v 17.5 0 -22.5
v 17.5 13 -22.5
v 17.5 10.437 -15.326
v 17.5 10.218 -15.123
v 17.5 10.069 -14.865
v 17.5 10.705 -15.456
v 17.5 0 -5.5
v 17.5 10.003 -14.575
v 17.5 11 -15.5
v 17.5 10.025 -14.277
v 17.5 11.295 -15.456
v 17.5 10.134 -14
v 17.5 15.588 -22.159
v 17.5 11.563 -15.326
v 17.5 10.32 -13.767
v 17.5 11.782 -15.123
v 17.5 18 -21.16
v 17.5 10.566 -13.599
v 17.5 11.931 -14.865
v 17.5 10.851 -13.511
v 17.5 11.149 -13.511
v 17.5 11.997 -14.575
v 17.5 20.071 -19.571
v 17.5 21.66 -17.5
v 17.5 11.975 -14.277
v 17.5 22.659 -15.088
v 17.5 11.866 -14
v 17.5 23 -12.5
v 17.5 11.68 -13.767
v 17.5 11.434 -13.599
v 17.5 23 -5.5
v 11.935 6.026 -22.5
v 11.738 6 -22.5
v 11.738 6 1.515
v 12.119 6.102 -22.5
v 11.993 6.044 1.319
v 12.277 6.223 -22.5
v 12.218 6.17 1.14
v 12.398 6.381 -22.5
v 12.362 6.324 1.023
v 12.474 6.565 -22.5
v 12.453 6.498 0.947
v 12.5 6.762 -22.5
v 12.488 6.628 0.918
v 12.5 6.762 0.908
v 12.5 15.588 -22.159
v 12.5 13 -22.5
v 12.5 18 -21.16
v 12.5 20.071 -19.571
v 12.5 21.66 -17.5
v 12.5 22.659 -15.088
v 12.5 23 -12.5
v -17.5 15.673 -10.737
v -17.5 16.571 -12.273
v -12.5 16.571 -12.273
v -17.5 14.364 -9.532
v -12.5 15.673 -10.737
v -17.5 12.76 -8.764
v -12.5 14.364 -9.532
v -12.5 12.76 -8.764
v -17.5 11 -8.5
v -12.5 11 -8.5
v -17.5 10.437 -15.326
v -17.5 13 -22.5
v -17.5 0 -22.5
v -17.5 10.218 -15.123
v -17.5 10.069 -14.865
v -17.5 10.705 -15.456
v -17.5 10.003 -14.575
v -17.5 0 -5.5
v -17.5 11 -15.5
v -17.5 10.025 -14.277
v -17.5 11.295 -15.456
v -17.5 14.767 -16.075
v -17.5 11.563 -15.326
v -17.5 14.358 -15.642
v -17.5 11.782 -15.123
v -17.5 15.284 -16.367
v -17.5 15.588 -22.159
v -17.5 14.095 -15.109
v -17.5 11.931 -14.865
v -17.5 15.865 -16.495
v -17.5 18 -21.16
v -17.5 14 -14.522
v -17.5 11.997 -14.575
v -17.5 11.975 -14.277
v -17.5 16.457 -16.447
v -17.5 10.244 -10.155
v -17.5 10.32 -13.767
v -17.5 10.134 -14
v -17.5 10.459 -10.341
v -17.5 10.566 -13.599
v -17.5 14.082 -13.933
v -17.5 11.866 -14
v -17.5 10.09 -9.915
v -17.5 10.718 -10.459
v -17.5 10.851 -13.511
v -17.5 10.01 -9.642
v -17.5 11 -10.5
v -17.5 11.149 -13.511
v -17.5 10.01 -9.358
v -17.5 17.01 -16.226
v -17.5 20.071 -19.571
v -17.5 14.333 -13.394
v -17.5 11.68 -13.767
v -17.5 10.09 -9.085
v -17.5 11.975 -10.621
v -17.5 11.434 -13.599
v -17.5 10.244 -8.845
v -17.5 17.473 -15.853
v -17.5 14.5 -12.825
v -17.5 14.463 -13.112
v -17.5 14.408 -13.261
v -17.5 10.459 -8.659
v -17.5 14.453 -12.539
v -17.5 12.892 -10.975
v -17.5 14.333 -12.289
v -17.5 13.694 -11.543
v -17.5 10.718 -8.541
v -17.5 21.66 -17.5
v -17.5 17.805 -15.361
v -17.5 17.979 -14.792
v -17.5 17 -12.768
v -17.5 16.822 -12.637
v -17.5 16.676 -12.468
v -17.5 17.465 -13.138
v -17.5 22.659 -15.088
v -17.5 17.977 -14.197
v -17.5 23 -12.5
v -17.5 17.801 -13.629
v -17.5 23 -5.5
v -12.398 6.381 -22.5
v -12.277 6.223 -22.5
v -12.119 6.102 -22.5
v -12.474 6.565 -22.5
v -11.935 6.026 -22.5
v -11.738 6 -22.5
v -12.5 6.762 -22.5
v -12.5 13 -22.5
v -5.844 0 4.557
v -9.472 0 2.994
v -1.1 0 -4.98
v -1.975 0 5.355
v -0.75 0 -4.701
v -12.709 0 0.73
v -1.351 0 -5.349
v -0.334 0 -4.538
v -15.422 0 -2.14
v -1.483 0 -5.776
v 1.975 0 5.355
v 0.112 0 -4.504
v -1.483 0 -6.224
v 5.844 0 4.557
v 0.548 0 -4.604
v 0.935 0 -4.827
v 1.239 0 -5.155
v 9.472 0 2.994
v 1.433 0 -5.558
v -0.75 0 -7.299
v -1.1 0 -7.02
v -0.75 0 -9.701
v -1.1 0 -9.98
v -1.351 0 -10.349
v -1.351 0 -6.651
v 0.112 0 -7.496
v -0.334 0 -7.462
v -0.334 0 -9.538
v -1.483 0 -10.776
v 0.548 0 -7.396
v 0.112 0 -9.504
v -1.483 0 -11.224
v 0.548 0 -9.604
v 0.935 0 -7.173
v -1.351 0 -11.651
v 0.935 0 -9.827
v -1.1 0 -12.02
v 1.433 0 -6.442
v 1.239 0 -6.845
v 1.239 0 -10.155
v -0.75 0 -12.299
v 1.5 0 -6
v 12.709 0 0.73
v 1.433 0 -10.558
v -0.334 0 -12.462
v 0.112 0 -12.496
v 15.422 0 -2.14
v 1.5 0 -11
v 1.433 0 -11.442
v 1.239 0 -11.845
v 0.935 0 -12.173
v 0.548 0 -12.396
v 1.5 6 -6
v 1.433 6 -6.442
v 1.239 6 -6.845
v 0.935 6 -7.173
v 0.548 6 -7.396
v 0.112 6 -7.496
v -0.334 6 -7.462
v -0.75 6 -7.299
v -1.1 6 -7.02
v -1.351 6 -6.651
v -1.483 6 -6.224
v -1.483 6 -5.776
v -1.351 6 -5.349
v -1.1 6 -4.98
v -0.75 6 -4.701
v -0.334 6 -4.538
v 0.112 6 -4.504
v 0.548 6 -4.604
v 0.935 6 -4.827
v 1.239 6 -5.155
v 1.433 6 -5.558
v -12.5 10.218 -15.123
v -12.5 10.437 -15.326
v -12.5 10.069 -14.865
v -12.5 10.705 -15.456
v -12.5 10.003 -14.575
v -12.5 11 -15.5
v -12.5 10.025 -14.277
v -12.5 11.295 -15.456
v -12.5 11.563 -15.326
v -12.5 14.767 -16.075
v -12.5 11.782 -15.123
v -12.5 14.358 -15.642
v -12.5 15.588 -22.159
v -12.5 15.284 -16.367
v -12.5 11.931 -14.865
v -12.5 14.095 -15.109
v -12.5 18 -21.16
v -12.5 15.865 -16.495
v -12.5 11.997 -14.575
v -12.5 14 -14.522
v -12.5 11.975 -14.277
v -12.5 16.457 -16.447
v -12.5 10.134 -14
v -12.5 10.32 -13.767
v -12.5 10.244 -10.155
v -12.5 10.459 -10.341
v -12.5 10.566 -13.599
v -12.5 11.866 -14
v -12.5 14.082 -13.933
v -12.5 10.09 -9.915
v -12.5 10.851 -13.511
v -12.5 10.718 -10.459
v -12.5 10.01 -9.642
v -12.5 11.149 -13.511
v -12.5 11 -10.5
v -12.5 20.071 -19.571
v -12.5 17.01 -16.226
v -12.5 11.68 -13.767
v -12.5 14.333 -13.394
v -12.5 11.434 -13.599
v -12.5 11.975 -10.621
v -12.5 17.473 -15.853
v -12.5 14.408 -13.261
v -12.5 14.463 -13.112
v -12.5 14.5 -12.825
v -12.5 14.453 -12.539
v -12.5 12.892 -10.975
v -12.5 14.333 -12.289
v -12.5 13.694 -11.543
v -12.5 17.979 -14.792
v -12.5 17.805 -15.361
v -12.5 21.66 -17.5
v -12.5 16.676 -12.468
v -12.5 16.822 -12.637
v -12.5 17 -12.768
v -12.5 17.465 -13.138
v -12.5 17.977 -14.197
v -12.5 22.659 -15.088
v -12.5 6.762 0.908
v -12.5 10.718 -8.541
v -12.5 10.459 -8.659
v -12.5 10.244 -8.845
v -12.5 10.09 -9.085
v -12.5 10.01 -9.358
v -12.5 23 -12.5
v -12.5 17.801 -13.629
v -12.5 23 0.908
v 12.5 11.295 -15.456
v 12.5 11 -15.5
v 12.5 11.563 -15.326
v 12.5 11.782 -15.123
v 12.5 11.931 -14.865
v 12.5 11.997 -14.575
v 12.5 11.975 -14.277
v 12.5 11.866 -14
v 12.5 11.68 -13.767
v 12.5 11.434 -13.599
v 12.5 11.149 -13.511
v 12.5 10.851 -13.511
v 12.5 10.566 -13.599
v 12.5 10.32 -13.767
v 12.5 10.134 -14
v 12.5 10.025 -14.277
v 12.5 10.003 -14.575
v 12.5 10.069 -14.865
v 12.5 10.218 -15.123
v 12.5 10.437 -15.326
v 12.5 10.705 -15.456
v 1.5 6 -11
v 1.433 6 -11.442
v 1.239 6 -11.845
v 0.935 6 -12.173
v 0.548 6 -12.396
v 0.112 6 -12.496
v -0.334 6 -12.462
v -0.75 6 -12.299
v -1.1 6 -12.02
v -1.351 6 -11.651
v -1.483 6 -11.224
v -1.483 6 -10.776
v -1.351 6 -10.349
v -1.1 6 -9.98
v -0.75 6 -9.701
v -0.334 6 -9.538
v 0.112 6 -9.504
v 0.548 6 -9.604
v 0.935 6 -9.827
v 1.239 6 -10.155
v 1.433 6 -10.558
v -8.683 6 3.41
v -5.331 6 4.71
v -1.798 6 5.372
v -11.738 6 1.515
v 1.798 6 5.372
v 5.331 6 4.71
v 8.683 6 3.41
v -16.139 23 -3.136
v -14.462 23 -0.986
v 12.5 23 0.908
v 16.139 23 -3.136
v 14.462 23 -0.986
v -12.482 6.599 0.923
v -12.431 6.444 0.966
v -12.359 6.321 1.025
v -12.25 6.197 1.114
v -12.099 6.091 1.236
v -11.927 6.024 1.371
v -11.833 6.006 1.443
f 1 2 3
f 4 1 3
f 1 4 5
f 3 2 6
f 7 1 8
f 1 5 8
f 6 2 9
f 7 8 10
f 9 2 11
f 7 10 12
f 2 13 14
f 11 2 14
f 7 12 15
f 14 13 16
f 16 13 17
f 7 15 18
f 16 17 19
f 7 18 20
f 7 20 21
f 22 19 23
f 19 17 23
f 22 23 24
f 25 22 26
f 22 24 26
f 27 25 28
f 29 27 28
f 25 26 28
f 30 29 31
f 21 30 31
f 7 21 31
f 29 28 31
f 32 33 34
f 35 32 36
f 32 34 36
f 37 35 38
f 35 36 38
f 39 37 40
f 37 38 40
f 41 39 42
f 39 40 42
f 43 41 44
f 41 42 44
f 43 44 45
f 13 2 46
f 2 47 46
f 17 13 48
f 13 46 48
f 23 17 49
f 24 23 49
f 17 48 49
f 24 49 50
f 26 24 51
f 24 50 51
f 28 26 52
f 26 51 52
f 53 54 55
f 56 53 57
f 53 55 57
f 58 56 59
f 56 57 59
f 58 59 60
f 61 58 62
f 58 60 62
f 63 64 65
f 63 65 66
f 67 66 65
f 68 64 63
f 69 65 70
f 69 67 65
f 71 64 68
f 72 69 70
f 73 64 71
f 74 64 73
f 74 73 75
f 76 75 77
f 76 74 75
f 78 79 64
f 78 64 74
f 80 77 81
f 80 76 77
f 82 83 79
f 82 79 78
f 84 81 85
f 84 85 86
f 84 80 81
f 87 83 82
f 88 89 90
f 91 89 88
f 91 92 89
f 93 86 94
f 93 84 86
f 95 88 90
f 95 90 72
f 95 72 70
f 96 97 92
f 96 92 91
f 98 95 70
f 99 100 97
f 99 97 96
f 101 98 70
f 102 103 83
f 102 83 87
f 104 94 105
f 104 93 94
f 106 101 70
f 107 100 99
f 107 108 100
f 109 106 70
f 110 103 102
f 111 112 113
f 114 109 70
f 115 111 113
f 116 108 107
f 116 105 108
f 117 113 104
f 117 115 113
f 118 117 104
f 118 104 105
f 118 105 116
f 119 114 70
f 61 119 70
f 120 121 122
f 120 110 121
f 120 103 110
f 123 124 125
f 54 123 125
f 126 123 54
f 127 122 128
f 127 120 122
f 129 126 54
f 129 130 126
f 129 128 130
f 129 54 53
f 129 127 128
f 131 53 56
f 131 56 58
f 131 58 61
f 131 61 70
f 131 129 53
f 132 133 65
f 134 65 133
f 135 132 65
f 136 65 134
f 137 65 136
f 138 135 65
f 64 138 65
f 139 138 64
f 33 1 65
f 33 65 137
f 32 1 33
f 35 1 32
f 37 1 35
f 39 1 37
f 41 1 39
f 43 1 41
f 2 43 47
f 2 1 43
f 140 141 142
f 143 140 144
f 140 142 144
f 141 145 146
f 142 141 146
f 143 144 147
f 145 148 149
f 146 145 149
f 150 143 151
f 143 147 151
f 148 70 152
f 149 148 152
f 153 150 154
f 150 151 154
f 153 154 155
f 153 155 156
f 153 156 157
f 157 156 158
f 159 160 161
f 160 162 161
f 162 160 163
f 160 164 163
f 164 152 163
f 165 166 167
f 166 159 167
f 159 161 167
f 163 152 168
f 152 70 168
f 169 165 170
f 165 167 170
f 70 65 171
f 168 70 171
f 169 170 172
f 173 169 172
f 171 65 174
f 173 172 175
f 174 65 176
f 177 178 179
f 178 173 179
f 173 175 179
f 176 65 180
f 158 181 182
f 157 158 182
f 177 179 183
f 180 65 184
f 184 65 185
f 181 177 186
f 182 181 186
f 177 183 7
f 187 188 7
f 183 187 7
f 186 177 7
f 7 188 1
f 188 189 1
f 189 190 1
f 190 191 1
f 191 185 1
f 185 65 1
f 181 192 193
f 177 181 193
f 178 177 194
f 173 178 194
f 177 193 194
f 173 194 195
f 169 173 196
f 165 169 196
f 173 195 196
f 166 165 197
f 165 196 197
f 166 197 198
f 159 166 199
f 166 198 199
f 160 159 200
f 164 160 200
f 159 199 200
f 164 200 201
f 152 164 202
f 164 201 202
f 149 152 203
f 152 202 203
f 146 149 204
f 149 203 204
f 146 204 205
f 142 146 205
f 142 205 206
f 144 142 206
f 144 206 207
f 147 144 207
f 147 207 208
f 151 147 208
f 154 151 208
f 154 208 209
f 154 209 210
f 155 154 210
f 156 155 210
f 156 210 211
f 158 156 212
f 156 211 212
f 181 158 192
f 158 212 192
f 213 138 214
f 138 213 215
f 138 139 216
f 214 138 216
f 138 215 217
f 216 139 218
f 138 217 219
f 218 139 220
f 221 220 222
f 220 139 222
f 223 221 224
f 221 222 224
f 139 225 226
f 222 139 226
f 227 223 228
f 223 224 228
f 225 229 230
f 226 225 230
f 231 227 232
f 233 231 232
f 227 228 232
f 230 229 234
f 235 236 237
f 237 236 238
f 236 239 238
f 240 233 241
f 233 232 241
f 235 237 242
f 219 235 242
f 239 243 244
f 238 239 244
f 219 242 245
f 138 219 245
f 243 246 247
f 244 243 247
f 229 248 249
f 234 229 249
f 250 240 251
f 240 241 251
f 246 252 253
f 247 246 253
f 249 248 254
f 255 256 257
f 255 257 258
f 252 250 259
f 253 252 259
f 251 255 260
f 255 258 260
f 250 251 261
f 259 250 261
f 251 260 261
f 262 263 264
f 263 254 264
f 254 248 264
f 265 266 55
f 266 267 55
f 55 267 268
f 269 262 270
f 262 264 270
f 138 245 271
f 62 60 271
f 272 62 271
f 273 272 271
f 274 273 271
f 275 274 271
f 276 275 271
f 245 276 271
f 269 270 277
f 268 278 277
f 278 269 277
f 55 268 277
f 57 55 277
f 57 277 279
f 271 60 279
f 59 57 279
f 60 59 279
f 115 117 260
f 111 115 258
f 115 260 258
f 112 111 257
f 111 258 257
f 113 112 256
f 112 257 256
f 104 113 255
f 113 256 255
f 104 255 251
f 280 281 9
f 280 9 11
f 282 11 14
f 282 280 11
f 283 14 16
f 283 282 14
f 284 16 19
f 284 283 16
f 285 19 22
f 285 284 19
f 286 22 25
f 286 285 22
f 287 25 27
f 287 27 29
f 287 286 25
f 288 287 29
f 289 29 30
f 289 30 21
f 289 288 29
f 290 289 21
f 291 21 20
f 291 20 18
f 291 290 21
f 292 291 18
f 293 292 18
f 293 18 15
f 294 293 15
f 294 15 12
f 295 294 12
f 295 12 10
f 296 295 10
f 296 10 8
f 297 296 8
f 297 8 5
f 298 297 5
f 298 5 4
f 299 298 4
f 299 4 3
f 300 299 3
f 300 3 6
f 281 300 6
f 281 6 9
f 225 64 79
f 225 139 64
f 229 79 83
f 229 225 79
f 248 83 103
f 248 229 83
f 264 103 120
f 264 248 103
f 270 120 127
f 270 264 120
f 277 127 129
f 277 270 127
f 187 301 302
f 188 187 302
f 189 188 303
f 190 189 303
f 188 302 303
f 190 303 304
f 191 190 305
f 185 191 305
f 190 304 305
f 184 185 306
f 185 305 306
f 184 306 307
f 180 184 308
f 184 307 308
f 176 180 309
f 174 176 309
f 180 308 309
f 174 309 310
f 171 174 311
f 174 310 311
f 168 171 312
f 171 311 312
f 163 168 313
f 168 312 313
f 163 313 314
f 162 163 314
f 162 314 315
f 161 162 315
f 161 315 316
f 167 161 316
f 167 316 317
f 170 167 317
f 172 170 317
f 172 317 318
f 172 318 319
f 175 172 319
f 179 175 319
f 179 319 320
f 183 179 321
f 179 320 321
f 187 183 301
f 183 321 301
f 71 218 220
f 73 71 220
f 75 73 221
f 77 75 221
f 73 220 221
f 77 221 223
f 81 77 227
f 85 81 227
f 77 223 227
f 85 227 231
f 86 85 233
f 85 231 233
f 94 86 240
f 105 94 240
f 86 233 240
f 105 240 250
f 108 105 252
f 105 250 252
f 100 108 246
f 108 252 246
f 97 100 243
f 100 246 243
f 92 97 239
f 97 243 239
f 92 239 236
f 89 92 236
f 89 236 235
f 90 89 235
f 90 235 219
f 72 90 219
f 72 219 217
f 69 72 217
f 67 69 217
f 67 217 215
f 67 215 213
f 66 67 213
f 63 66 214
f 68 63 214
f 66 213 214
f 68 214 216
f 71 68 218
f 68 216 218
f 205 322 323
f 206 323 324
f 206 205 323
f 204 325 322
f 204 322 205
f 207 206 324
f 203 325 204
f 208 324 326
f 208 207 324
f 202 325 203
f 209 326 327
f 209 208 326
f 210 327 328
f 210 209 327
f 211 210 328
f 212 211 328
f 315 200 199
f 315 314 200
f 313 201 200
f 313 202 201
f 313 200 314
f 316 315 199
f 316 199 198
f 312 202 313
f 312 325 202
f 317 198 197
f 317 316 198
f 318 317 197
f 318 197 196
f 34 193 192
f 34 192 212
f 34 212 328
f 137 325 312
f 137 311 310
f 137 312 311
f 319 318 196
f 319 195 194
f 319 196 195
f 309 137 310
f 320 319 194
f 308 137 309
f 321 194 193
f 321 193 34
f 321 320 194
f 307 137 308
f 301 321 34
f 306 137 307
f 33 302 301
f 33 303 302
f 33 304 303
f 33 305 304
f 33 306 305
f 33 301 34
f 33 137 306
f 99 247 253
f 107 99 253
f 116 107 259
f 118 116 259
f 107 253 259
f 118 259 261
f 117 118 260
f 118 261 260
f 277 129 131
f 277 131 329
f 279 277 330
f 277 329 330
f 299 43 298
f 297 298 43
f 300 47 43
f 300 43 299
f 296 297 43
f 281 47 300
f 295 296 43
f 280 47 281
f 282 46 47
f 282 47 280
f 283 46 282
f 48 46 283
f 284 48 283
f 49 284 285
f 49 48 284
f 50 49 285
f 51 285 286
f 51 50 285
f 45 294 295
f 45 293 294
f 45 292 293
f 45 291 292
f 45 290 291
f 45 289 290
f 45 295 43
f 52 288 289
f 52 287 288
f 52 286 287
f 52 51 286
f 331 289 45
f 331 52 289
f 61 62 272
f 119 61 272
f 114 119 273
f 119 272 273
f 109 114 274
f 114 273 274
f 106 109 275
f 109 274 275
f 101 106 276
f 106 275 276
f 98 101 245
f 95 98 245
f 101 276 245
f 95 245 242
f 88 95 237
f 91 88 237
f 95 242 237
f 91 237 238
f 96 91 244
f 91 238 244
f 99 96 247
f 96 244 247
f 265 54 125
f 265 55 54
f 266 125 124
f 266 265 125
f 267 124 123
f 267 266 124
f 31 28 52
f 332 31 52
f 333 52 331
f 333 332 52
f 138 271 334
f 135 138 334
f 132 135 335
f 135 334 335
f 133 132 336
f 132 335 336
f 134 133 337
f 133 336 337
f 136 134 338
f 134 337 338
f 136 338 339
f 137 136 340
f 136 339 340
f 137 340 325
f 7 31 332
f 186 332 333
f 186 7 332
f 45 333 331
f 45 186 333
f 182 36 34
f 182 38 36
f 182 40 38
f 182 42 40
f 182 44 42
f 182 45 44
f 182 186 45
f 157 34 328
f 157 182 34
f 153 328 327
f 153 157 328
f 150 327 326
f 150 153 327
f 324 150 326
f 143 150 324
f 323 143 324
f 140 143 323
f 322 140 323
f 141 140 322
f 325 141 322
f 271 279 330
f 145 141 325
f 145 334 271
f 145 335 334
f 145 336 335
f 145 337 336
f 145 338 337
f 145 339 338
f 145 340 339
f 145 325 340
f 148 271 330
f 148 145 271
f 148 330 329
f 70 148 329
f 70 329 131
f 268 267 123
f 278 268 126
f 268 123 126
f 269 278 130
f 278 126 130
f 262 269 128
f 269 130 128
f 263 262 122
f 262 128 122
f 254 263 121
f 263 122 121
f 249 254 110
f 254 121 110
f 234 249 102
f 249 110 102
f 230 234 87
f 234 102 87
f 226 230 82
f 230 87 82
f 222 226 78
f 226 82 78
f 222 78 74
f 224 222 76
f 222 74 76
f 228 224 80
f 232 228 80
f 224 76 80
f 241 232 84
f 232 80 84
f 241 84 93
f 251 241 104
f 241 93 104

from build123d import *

# Parameters (mm, degrees)
SKETCH1_W           = 35
SKETCH1_H           = 45
BOSS_EXTRUDE1_DEPTH = 6
SKETCH2_W           = 45
SKETCH2_H           = 17
BOSS_EXTRUDE2_DEPTH = 5
SKETCH3_R           = 1
CUT_EXTRUDE1_DEPTH  = 5
SKETCH3_2_R         = 1
CUT_EXTRUDE2_DEPTH  = 30
SKETCH4_R           = 2
CUT_EXTRUDE3_DEPTH  = 5
FILLET1_R           = 0.762
FILLET2_R           = 10
FILLET3_R           = 1
CUT_EXTRUDE4_DEPTH  = 23
SKETCH6_R           = 1.5
CUT_EXTRUDE5_DEPTH  = 6


with BuildPart() as part:
    # Sketch1 → Boss-Extrude1 (new body)
    with BuildSketch(Plane(origin=(0, 0, 0), x_dir=(1, 0, 0), z_dir=(0, 1, 0))):
        Rectangle(SKETCH1_W, SKETCH1_H)
    extrude(amount=BOSS_EXTRUDE1_DEPTH)

    # Sketch2 → Boss-Extrude2 (add)
    with BuildSketch(Plane.ZY.offset(17.5)):
        with Locations((0, 14.5)):
            Rectangle(SKETCH2_W, SKETCH2_H)
    boss_extrude2 = extrude(amount=-BOSS_EXTRUDE2_DEPTH)

    # Mirror1: Boss-Extrude2 across plane
    add(boss_extrude2.mirror(Plane(origin=(0, 0, 0), x_dir=(0, 0, 1), z_dir=(1, 0, 0))))

    # Sketch3 → Cut-Extrude1 (cut)
    with BuildSketch(Plane(origin=(-12.5, 0, 0), x_dir=(0, 0, -1), z_dir=(1, 0, 0))):
        with Locations((14.5, 11)):
            Circle(SKETCH3_R)
        with BuildLine():
            ThreePointArc((14.5, 17), (10.257359313, 15.242640687), (8.5, 11))
            ThreePointArc((8.5, 11), (9.5, 10), (10.5, 11))
            ThreePointArc((10.5, 11), (11.671572875, 13.828427125), (14.5, 15))
            ThreePointArc((14.5, 15), (15.5, 16), (14.5, 17))
        make_face()
    extrude(amount=-CUT_EXTRUDE1_DEPTH, mode=Mode.SUBTRACT)

    # Sketch3<2> → Cut-Extrude2 (cut)
    with BuildSketch(Plane(origin=(-12.5, 0, 0), x_dir=(0, 0, -1), z_dir=(1, 0, 0))):
        with Locations((14.5, 11)):
            Circle(SKETCH3_2_R)
    extrude(amount=CUT_EXTRUDE2_DEPTH, mode=Mode.SUBTRACT)

    # Sketch4 → Cut-Extrude3 (cut)
    with BuildSketch(Plane.ZY.offset(17.5)):
        with Locations((-14.5, 16)):
            Circle(SKETCH4_R)
    extrude(amount=-CUT_EXTRUDE3_DEPTH, mode=Mode.SUBTRACT)

    # Fillet1
    fillet1_edges = [part.edges().sort_by_distance(p)[0] for p in [
        (-12.5, 6, 0),
        (12.5, 6, 0),
    ]]
    fillet(fillet1_edges, radius=FILLET1_R)

    # Fillet2
    fillet2_edges = [part.edges().sort_by_distance(p)[0] for p in [
        (-15, 23, -22.5),
        (-15, 23, 22.5),
        (15, 23, 22.5),
        (15, 23, -22.5),
    ]]
    fillet(fillet2_edges, radius=FILLET2_R)

    # Fillet3
    fillet3_edges = [part.edges().sort_by_distance(p)[0] for p in [
        (-15, 16.7, -12.6265006),
        (-15, 14.7, -12.980131585),
    ]]
    fillet(fillet3_edges, radius=FILLET3_R)

    # Sketch5 → Cut-Extrude4 (cut)
    with BuildSketch(Plane.XZ):
        with BuildLine():
            Line((17.5, 22.5), (17.5, -5.5))
            ThreePointArc((17.5, -5.5), (0, 5.455076458), (-17.5, -5.5))
            Line((-17.5, -5.5), (-17.5, 22.5))
            Line((-17.5, 22.5), (17.5, 22.5))
        make_face()
    extrude(amount=-CUT_EXTRUDE4_DEPTH, mode=Mode.SUBTRACT)

    # Sketch6 → Cut-Extrude5 (cut)
    with BuildSketch(Plane(origin=(0, 6, 0), x_dir=(1, 0, 0), z_dir=(0, 1, 0))):
        with Locations((0, 11)):
            Circle(SKETCH6_R)
        with Locations((0, 6)):
            Circle(SKETCH6_R)
    extrude(amount=-CUT_EXTRUDE5_DEPTH, mode=Mode.SUBTRACT)


solid = part.part
